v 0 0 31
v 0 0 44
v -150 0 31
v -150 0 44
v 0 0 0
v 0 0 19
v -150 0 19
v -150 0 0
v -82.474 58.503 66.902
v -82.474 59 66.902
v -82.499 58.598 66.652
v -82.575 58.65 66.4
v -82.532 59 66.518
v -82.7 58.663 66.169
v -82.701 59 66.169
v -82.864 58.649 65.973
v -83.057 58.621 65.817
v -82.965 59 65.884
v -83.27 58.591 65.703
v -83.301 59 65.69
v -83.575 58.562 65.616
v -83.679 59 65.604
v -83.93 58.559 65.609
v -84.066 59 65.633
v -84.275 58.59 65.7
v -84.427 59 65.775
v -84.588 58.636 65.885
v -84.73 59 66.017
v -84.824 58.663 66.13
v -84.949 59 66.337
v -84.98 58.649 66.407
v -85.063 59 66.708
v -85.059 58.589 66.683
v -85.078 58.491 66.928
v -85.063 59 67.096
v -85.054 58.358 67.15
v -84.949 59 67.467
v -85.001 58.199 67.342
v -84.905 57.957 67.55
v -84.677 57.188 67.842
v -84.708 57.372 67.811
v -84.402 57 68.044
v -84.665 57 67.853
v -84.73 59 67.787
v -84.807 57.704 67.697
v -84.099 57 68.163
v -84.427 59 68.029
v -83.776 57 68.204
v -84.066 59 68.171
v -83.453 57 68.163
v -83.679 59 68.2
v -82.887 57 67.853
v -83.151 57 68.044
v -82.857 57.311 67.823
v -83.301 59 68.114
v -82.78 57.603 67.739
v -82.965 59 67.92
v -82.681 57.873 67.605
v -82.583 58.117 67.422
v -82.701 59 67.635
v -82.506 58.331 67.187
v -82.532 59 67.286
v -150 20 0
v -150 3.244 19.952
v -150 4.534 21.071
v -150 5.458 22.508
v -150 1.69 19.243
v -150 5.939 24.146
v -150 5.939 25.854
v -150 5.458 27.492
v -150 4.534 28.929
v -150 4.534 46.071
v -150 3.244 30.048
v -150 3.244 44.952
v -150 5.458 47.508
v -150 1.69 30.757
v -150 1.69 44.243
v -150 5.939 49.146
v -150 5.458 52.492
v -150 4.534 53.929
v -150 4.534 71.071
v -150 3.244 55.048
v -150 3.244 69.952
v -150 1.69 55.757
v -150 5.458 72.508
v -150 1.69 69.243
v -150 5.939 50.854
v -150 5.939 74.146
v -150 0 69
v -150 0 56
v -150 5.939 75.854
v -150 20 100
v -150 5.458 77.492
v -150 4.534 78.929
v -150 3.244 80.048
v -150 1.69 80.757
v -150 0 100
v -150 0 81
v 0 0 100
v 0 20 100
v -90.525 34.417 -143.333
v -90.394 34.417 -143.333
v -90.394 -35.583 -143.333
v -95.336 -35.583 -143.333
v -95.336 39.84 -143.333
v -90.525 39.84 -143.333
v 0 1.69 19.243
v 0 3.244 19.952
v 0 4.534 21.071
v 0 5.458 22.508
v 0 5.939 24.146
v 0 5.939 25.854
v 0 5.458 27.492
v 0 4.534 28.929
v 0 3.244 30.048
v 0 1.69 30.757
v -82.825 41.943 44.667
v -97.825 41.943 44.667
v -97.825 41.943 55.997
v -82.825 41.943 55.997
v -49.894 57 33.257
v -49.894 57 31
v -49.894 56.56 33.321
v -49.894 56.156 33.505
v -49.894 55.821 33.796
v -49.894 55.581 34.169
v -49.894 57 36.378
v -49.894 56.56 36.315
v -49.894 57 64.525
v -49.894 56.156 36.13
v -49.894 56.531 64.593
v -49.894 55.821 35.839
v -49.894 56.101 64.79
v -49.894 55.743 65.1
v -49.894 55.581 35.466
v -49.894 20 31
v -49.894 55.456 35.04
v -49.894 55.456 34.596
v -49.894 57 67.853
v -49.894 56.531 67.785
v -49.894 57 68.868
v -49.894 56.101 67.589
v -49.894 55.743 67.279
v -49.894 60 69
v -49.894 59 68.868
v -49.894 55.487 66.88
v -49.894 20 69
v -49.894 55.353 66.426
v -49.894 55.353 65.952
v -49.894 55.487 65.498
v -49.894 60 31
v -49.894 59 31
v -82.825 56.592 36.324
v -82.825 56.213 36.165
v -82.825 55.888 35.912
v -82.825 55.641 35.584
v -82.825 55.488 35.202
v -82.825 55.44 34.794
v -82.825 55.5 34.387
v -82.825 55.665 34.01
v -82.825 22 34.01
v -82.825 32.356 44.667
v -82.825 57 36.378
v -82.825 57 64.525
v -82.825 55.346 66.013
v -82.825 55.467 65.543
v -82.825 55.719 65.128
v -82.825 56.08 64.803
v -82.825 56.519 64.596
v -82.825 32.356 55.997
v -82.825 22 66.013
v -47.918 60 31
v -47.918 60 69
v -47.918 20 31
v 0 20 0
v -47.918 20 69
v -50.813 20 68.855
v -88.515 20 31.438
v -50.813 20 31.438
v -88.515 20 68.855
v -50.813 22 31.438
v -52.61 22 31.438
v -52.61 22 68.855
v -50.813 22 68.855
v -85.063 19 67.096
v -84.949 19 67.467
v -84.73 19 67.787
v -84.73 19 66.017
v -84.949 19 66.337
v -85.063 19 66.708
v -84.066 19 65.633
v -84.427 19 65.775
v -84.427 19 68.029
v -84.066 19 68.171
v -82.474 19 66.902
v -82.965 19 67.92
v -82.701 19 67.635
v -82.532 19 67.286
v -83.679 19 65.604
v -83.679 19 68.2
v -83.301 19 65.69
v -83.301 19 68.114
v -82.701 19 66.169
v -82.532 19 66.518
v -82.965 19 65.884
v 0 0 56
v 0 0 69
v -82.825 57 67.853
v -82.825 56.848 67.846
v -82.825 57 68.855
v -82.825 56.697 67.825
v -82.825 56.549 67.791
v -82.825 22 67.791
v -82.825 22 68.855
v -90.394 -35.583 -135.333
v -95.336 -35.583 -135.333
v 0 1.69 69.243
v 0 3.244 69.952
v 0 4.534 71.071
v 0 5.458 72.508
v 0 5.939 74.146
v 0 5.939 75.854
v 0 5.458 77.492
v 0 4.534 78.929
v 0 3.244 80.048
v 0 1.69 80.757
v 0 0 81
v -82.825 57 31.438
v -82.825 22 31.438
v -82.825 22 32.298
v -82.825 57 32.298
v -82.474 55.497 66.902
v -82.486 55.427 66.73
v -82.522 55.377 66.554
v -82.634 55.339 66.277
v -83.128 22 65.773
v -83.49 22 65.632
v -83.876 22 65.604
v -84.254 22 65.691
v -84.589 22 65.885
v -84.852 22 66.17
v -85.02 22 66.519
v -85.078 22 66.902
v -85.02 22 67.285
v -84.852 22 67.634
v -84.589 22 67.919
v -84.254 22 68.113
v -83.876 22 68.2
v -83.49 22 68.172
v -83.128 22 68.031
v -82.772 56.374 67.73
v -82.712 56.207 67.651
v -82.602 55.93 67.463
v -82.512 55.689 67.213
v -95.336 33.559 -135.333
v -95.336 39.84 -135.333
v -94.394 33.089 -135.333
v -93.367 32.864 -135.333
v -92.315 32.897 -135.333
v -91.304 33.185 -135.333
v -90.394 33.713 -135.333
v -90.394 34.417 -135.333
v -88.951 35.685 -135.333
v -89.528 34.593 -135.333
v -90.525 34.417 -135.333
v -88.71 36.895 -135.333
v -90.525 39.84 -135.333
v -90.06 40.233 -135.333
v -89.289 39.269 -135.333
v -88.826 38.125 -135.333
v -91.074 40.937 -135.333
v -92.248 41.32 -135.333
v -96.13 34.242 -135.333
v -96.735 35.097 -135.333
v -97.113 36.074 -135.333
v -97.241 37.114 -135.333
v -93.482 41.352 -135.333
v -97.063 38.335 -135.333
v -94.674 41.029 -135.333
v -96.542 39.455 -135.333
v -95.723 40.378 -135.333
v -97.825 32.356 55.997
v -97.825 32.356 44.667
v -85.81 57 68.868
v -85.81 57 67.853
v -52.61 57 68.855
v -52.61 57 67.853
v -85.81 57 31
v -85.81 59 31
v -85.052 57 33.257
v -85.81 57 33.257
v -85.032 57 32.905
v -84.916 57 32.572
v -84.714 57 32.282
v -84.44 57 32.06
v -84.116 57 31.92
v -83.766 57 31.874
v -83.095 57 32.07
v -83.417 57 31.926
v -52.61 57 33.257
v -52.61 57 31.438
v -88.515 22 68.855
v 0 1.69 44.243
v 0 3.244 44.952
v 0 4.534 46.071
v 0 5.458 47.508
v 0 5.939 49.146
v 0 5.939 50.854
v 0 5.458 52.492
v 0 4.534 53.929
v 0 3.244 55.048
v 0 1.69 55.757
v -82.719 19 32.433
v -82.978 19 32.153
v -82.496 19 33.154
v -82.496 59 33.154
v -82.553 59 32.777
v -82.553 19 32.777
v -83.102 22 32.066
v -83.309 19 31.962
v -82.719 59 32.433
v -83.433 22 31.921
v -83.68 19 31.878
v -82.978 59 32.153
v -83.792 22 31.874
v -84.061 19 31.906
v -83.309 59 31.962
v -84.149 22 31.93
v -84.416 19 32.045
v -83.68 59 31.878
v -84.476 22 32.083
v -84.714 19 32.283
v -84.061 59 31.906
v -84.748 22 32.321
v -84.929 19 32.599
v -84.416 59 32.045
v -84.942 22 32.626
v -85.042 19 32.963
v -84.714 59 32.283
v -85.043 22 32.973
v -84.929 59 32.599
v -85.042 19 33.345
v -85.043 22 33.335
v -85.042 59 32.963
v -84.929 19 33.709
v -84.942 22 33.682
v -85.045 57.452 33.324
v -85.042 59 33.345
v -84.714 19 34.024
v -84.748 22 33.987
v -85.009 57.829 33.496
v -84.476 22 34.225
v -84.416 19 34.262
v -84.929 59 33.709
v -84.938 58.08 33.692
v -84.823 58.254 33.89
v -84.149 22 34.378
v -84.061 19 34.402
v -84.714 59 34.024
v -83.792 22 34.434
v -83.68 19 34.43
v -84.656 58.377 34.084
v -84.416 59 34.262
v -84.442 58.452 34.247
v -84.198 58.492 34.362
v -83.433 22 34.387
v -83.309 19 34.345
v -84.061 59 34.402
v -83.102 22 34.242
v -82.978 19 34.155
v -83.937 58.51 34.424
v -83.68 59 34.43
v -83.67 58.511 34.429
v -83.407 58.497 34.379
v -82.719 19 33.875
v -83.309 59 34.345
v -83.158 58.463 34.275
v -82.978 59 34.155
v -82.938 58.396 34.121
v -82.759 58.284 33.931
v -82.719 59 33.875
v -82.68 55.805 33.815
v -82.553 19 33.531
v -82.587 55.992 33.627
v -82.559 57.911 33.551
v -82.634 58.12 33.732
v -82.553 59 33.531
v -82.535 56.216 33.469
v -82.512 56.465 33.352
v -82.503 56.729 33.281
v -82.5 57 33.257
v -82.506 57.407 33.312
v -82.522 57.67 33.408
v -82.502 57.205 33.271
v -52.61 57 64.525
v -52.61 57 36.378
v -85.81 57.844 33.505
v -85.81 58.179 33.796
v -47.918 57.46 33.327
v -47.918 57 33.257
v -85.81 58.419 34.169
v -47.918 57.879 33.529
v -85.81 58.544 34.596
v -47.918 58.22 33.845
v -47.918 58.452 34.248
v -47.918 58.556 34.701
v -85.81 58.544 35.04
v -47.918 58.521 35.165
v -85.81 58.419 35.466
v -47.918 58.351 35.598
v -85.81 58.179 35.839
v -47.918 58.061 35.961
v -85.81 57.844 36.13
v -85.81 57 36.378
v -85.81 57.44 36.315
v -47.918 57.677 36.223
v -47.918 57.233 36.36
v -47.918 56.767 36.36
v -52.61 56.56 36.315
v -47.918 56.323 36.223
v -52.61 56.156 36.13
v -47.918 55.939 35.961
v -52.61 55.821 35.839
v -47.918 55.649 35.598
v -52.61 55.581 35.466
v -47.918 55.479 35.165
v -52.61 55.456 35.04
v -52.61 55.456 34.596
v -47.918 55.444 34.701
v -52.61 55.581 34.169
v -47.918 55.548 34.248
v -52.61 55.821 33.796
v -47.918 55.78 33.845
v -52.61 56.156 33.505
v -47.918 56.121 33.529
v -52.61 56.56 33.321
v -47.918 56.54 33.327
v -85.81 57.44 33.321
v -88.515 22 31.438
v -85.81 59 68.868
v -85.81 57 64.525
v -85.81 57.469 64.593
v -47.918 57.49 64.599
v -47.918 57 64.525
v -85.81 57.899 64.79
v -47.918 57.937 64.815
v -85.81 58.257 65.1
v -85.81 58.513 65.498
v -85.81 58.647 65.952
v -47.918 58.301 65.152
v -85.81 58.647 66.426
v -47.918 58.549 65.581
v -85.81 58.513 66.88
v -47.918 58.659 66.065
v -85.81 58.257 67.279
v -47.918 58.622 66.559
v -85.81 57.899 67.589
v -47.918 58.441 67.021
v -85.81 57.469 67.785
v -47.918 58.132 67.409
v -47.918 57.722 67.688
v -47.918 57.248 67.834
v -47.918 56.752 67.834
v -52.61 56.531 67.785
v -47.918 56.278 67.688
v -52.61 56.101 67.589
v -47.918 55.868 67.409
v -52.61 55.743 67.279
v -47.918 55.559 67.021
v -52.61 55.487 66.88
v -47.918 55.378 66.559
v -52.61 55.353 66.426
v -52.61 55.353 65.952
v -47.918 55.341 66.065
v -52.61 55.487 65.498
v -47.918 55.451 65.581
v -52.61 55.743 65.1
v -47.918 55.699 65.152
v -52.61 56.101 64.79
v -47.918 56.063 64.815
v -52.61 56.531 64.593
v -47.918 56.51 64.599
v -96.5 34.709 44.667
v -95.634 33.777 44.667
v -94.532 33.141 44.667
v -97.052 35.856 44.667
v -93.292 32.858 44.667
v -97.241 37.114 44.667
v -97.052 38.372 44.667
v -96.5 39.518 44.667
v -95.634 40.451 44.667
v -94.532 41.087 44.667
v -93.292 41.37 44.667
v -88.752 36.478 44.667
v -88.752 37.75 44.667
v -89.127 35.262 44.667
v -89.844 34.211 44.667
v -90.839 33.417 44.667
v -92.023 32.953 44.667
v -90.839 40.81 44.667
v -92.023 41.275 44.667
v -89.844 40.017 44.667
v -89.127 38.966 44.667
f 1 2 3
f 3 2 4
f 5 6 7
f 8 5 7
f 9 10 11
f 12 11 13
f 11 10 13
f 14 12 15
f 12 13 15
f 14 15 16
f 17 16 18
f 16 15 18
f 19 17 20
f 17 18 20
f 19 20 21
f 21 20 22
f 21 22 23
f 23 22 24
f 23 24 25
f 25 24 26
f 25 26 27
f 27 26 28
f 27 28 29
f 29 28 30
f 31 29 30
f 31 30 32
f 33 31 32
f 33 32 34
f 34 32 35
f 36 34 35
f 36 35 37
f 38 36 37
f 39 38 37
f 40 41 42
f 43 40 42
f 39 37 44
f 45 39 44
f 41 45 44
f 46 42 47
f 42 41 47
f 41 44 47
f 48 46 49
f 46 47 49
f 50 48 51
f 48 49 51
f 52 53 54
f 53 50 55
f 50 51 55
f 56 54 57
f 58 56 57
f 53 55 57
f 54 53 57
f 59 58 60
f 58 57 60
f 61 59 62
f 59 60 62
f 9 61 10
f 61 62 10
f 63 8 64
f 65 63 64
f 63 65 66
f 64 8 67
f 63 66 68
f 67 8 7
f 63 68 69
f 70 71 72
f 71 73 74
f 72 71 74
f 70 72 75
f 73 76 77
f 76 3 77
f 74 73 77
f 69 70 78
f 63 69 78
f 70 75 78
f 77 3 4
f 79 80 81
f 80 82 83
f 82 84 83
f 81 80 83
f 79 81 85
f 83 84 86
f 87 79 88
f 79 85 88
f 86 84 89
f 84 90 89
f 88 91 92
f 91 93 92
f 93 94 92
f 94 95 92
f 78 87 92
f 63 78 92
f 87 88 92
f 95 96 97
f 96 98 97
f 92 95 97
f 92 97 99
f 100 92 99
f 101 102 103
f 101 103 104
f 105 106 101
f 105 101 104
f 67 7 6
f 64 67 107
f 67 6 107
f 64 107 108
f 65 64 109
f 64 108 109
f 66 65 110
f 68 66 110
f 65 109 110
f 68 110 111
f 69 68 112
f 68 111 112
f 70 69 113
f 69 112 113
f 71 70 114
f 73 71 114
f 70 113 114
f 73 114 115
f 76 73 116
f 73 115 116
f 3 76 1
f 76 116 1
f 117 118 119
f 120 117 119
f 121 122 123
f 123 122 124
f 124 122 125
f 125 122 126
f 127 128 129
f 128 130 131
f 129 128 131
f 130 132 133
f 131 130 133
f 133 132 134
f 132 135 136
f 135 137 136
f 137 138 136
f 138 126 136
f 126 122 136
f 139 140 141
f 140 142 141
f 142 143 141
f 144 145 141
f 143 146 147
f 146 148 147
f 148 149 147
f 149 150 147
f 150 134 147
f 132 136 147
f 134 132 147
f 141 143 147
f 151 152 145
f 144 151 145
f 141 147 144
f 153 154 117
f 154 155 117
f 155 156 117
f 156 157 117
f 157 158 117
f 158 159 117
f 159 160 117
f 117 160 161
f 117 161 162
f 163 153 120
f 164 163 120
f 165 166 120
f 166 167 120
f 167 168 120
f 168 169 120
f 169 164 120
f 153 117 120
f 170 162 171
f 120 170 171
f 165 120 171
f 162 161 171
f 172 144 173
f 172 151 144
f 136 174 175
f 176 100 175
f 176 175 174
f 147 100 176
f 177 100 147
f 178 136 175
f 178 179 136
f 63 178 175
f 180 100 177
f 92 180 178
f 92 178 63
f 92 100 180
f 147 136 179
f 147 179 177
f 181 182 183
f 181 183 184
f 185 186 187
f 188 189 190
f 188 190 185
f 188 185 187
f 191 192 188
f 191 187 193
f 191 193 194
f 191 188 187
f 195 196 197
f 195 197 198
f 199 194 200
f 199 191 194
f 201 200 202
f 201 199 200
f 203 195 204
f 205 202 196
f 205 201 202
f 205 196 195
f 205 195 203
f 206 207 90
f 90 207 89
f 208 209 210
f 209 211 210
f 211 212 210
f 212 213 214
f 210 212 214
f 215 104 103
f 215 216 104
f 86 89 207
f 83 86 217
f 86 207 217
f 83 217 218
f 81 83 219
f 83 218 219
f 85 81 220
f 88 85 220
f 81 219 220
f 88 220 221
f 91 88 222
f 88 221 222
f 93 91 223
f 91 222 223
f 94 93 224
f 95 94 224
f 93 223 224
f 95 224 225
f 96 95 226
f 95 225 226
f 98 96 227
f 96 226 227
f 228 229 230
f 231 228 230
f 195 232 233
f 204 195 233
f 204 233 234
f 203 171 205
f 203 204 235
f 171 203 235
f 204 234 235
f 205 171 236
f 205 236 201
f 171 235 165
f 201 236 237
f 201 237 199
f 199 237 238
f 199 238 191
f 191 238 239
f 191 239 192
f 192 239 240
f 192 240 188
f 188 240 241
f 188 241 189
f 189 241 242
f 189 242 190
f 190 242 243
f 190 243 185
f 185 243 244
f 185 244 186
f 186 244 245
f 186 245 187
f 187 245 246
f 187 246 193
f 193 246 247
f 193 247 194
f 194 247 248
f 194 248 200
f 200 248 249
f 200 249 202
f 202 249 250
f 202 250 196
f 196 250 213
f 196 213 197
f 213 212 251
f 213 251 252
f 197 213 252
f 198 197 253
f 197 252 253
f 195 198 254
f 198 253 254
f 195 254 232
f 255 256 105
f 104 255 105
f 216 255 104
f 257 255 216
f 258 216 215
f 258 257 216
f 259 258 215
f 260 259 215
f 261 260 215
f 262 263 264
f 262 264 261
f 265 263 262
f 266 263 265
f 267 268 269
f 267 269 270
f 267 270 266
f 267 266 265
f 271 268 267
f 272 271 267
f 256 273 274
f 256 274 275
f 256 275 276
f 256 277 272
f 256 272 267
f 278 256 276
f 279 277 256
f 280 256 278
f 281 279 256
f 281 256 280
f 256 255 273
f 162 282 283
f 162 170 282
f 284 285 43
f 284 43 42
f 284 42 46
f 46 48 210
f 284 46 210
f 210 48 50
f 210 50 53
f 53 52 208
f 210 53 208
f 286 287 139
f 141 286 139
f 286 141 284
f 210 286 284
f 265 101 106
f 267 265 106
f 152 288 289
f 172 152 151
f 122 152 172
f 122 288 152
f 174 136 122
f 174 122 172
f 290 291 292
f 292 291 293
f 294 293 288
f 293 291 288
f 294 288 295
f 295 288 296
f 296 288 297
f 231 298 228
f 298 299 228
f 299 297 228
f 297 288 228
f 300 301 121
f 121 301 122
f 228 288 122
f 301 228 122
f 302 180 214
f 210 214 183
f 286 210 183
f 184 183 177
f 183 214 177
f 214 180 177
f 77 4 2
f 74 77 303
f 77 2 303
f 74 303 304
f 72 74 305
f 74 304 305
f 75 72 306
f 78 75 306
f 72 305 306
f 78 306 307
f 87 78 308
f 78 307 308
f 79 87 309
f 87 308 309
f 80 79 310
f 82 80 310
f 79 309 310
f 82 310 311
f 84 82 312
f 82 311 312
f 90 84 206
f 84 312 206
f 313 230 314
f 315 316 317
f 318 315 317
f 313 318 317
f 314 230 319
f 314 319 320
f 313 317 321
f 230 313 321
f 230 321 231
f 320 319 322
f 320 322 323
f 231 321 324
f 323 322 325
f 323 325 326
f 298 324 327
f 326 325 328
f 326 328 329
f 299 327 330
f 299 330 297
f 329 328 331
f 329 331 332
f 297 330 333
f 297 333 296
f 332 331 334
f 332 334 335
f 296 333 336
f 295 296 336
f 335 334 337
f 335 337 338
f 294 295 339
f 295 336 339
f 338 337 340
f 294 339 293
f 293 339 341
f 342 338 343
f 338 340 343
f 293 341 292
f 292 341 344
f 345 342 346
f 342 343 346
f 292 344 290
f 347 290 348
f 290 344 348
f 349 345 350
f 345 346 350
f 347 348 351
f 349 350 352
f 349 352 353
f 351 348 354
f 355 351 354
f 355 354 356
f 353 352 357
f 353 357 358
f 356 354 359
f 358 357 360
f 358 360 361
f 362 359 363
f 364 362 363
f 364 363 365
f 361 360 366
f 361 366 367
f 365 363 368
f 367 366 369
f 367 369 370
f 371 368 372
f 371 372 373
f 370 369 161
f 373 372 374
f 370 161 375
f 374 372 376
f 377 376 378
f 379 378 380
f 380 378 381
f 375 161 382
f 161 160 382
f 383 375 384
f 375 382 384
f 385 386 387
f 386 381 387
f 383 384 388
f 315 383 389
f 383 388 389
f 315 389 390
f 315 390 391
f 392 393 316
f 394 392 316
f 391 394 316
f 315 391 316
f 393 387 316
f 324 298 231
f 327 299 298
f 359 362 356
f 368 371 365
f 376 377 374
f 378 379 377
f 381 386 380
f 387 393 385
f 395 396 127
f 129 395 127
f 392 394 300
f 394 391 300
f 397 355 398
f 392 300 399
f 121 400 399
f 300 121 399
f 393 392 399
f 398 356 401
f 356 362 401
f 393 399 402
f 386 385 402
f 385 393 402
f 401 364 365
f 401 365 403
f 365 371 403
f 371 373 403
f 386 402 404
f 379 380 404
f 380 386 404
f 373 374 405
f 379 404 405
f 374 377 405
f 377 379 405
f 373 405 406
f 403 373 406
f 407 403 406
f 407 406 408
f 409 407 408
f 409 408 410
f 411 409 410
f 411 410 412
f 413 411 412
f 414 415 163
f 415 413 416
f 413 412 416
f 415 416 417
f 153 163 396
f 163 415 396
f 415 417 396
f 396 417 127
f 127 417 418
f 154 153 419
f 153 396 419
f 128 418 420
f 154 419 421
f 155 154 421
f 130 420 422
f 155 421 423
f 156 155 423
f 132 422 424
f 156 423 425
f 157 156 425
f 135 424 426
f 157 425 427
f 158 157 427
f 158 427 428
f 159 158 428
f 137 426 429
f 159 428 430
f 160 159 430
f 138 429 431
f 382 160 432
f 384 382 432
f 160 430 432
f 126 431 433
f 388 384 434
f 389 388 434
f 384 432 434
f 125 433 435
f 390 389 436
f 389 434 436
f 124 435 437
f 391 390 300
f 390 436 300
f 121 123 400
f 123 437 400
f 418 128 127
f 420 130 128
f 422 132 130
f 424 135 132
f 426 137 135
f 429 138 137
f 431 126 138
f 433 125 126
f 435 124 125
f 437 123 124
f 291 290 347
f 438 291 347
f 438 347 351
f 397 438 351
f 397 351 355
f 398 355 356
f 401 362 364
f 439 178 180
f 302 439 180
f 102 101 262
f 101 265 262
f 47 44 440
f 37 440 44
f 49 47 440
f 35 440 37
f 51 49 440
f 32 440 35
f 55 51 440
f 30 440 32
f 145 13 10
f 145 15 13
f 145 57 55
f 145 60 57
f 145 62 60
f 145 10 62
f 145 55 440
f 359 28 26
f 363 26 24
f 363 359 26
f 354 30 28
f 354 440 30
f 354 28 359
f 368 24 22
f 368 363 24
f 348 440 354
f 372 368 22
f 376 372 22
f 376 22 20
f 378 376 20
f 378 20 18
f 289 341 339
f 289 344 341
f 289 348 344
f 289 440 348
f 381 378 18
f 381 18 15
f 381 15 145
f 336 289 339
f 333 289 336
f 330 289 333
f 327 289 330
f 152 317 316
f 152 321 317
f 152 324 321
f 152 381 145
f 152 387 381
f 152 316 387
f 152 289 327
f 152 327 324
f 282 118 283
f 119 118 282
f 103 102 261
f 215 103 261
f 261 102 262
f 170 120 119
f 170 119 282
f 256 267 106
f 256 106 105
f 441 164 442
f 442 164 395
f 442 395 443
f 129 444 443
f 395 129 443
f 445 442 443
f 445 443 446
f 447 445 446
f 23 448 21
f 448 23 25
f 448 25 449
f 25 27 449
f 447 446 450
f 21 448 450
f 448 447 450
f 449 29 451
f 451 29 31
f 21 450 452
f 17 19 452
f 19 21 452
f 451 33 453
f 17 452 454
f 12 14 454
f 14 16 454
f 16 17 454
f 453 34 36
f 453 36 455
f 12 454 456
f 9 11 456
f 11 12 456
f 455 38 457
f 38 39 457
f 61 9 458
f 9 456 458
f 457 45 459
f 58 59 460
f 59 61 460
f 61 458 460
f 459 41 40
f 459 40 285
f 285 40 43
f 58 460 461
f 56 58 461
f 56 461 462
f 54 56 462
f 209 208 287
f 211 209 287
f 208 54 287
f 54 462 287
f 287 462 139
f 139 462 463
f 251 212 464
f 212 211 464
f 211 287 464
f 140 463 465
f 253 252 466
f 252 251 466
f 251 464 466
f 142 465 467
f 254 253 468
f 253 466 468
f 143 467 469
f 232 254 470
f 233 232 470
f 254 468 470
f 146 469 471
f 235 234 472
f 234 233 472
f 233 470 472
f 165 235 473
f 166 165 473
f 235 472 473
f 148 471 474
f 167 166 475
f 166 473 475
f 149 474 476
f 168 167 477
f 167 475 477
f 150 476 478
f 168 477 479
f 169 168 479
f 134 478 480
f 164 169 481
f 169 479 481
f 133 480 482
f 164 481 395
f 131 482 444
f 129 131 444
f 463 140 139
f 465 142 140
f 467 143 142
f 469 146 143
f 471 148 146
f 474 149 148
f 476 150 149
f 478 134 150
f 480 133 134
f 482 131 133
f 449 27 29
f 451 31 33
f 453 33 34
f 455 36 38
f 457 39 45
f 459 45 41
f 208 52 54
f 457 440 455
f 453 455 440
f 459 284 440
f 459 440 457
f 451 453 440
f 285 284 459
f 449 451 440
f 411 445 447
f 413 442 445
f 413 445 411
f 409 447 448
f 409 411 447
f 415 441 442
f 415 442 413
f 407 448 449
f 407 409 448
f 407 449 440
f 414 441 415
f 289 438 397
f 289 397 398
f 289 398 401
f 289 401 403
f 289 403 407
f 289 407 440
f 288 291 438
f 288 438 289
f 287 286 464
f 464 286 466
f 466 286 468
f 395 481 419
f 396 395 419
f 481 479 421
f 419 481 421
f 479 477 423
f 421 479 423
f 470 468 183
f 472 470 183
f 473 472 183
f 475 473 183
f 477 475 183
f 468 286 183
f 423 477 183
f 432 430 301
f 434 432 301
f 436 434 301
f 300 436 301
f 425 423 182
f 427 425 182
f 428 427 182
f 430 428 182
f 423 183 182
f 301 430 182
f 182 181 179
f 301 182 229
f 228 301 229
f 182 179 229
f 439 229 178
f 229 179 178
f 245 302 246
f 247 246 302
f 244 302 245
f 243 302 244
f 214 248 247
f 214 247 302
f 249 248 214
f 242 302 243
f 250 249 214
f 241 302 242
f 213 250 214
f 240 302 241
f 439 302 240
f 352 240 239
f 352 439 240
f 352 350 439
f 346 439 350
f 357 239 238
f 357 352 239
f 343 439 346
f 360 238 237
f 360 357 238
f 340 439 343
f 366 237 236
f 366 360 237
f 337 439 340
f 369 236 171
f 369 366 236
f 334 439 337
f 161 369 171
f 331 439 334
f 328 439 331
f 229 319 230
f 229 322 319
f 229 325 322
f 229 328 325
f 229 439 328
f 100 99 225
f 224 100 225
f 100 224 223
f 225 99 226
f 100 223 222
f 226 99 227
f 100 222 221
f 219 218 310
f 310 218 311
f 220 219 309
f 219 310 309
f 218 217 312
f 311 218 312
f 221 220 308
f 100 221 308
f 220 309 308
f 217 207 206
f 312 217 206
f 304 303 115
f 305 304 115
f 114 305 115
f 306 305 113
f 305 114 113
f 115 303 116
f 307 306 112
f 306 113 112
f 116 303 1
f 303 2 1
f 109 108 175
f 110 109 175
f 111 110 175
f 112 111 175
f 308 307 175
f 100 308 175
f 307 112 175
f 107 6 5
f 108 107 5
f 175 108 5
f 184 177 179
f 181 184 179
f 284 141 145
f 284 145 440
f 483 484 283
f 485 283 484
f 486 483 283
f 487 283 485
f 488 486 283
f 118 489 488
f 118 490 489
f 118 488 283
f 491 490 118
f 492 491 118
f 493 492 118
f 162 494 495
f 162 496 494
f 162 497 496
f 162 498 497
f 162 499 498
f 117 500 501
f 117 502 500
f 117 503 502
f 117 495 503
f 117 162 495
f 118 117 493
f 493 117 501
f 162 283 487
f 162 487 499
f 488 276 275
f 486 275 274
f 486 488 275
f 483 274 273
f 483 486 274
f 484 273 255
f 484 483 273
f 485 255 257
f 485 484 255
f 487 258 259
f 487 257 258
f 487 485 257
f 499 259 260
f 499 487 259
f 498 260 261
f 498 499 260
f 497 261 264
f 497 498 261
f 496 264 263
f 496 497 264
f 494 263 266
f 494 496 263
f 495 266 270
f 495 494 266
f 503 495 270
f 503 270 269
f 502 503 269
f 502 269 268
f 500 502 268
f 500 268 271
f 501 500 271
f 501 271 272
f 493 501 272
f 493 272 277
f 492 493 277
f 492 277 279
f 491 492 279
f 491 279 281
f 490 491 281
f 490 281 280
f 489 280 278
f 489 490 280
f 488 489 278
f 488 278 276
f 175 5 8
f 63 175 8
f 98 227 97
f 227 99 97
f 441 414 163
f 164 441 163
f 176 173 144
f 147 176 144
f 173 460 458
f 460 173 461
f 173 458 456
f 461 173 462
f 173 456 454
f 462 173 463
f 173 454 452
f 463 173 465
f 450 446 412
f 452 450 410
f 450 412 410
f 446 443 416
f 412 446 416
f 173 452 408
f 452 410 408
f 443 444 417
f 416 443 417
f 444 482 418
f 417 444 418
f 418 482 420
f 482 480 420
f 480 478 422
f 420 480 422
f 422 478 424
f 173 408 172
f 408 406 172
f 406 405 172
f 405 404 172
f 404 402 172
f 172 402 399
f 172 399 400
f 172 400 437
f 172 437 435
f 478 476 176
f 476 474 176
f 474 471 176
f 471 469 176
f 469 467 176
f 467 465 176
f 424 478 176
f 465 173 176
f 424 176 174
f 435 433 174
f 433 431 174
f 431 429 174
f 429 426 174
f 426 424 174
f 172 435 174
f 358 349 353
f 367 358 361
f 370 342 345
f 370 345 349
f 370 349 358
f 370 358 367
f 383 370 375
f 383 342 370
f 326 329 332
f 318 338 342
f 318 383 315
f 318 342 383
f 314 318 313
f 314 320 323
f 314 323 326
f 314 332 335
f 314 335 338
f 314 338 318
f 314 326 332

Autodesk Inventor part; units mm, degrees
ref_plane "YZ Plane" through (0, 0, 0) normal (1, 0, 0) x (0, 1, 0)
ref_plane "XZ Plane" through (0, 0, 0) normal (0, 1, 0) x (-1, 0, 0)
ref_plane "XY Plane" through (0, 0, 0) normal (0, 0, 1) x (1, 0, 0)
sketch "Sketch1" plane through (0, 0, 0) normal (0, 1, 0) x (-1, 0, 0)
  line L0 (0, 0) -> (150, 0)
  line L1 (150, 0) -> (150, 100)
  line L2 (150, 100) -> (0, 100)
  line L3 (0, 100) -> (0, 0)
  dimension "d0" = 150
  dimension "d1" = 100
extrude "Extrusion1" add sketch "Sketch1" along normal blind 20
sketch "Sketch2" plane through (0, 20, 0) normal (0, 1, 0) x (1, 0, 0)
  point P0 (0, 0)
sketch "Sketch3" plane through (0, 20, 0) normal (0, 1, 0) x (1, 0, 0)
  point P0 (0, 0)
sketch "Sketch4" plane through (0, 20, 0) normal (0, 1, 0) x (1, 0, 0)
  line L0 (-88.5149, -68.8546) -> (-50.8129, -68.8546)
  line L1 (-50.8129, -68.8546) -> (-50.8129, -31.4381)
  line L2 (-50.8129, -31.4381) -> (-88.5149, -31.4381)
  line L3 (-88.5149, -31.4381) -> (-88.5149, -68.8546)
  point P0 (0, 0)
extrude "Extrusion2" add sketch "Sketch4" along normal blind 2
sketch "Sketch8" plane through (0, 22, 0) normal (0, 1, 0) x (1, 0, 0)
  point P0 (0, 0)
sketch "Sketch9" plane through (0, 22, 0) normal (0, 1, 0) x (1, 0, 0)
  line L0 (-50.8129, -68.8546) -> (-88.5149, -68.8546) projected
  line L1 (-88.5149, -31.4381) -> (-50.8129, -31.4381) projected
  line L2 (-82.8248, -68.8546) -> (-52.6097, -68.8546)
  line L3 (-52.6097, -68.8546) -> (-52.6097, -31.4381)
  line L4 (-52.6097, -31.4381) -> (-82.8248, -31.4381)
  line L5 (-82.8248, -31.4381) -> (-82.8248, -68.8546)
  point P0 (0, 0)
extrude "Extrusion5" add sketch "Sketch9" along normal blind 35
sketch "Sketch10" plane through (-82.8248, 22, 31.4381) normal (-1, 0, 0) x (0, 0, 1)
  line L0 (13.2287, 19.9432) -> (24.5588, 19.9432)
  line L1 (24.5588, 19.9432) -> (24.5588, 10.3562)
  line L2 (24.5588, 10.3562) -> (13.2287, 10.3562)
  line L3 (13.2287, 10.3562) -> (13.2287, 19.9432)
  point P0 (-31.4381, -22)
extrude "Extrusion6" add sketch "Sketch10" along normal blind 15
sketch "Sketch12" plane through (-82.8248, 32.3562, 44.6668) normal (0, 0, -1) x (-1, 0, 0)
  circle A0 centre (10.1482, 4.7576) radius 4.2682
  point P0 (-82.8248, -32.3562)
extrude "Extrusion7" add sketch "Sketch12" along normal blind 180
sketch "Sketch13" plane through (-97.8248, 22, 31.4381) normal (-1, 0, 0) x (0, 0, 1)
  point P0 (-31.4381, -22)
sketch "Sketch14" plane through (0, 0, 0) normal (0, 0, 1) x (1, 0, 0)
  point P0 (0, 0)
sketch "Sketch15" plane through (0, 0, 0) normal (0, 1, 0) x (-1, 0, 0)
  point P0 (0, 0)
sketch "Sketch16" plane through (0, 0, 0) normal (0, 1, 0) x (-1, 0, 0)
  point P0 (0, 0)
sketch "Sketch17" plane through (-92.973, 37.1137, -135.3332) normal (0, 0, -1) x (-1, 0, 0)
  circle A0 centre (0, 0) radius 4.2682 projected
  point P0 (-92.973, -37.1137)
sketch "Sketch18" plane through (-92.973, 37.1137, -135.3332) normal (0, 0, -1) x (-1, 0, 0)
  point P0 (-92.973, -37.1137)
sketch "Sketch19" plane through (-92.973, 37.1137, -135.3332) normal (0, 0, -1) x (-1, 0, 0)
  point P0 (-92.973, -37.1137)
sketch "Sketch20" plane through (-92.973, 37.1137, -135.3332) normal (0, 0, -1) x (-1, 0, 0)
  line L0 (-2.448, 2.726) -> (2.3625, 2.726)
  line L1 (2.3625, 2.726) -> (2.3625, -2.6968)
  line L2 (2.3625, -2.6968) -> (-2.448, -2.6968)
  line L3 (-2.448, -2.6968) -> (-2.448, 2.726)
  point P0 (-92.973, -37.1137)
extrude "Extrusion8" add sketch "Sketch20" along normal blind 8
sketch "Sketch21" plane through (-95.3355, 34.417, -135.3332) normal (0, -1, 0) x (1, 0, 0)
  point P0 (95.3355, 135.3332)
sketch "Sketch22" plane through (-95.3355, 34.417, -135.3332) normal (0, -1, 0) x (1, 0, 0)
  point P0 (95.3355, 135.3332)
sketch "Sketch23" plane through (-95.3355, 34.417, -135.3332) normal (0, -1, 0) x (1, 0, 0)
  line L0 (0, -8) -> (4.8105, -8) projected
  line L1 (-1.9057, 0) -> (6.6307, 0) projected
  line L2 (0, -8) -> (4.9417, -8)
  line L3 (4.9417, -8) -> (4.9417, 0)
  line L4 (4.9417, 0) -> (0, 0)
  line L5 (0, 0) -> (0, -8)
  point P0 (95.3355, 135.3332)
extrude "Extrusion9" add sketch "Sketch23" along normal blind 70
sketch "Sketch27" plane through (0, 0, 100) normal (1, 0, 0) x (0, 0, -1)
  line L0 (0, 0) -> (100, 0)
  line L1 (100, 0) -> (50, 0)
  line L2 (100, 0) -> (0, 0) projected
  line L3 (75, 0) -> (50, 0)
  line L4 (0, 0) -> (50, 0)
  circle A0 centre (25, 0) radius 6
  circle A1 centre (50, 0) radius 6
  circle A2 centre (75, 0) radius 6
  dimension "d24" = 12
  dimension "d25" = 12
  dimension "d26" = 12
extrude "Extrusion10" cut sketch "Sketch27" along normal through all both and the other way through all
sketch "Sketch30" plane through (0, 57, 0) normal (0, 1, 0) x (1, 0, 0)
  line L0 (-150, -31) -> (0, -31) projected
  line L1 (-85.8103, -31) -> (-48.4742, -31)
  line L2 (-48.4742, -31) -> (-48.4742, -68.8679)
  line L3 (-48.4742, -68.8679) -> (-85.8103, -68.8679)
  line L4 (-85.8103, -68.8679) -> (-85.8103, -31)
  point P0 (0, 0)
extrude "Extrusion11" add sketch "Sketch30" along normal blind 2
sketch "Sketch31" plane through (0, 20, 0) normal (0, 1, 0) x (1, 0, 0)
  line L0 (0, -69) -> (-150, -69) projected
  line L1 (-150, -31) -> (0, -31) projected
  line L2 (-49.8943, -69) -> (-47.9179, -69)
  line L3 (-47.9179, -69) -> (-47.9179, -31)
  line L4 (-47.9179, -31) -> (-49.8943, -31)
  line L5 (-49.8943, -31) -> (-49.8943, -69)
  point P0 (0, 0)
extrude "Extrusion12" add sketch "Sketch31" along normal blind 40
sketch "Sketch32" plane through (0, 59, 0) normal (0, 1, 0) x (1, 0, 0)
  circle A0 centre (-83.7761, -33.1539) radius 1.2799
  circle A1 centre (-83.7761, -66.902) radius 1.3017
  point P0 (0, 0)
extrude "Extrusion13" cut sketch "Sketch32" against normal blind 40
sketch "Sketch33" plane through (-47.9179, 20, 69) normal (1, 0, 0) x (0, 0, -1)
  line L0 (0.1321, 37) -> (38, 37) projected
  circle A0 centre (34.1824, 37) radius 1.5602
  circle A1 centre (2.8109, 37) radius 1.6636
  point P0 (69, -20)
extrude "Extrusion14" cut sketch "Sketch33" against normal blind 40
properties part number "Vertical"
